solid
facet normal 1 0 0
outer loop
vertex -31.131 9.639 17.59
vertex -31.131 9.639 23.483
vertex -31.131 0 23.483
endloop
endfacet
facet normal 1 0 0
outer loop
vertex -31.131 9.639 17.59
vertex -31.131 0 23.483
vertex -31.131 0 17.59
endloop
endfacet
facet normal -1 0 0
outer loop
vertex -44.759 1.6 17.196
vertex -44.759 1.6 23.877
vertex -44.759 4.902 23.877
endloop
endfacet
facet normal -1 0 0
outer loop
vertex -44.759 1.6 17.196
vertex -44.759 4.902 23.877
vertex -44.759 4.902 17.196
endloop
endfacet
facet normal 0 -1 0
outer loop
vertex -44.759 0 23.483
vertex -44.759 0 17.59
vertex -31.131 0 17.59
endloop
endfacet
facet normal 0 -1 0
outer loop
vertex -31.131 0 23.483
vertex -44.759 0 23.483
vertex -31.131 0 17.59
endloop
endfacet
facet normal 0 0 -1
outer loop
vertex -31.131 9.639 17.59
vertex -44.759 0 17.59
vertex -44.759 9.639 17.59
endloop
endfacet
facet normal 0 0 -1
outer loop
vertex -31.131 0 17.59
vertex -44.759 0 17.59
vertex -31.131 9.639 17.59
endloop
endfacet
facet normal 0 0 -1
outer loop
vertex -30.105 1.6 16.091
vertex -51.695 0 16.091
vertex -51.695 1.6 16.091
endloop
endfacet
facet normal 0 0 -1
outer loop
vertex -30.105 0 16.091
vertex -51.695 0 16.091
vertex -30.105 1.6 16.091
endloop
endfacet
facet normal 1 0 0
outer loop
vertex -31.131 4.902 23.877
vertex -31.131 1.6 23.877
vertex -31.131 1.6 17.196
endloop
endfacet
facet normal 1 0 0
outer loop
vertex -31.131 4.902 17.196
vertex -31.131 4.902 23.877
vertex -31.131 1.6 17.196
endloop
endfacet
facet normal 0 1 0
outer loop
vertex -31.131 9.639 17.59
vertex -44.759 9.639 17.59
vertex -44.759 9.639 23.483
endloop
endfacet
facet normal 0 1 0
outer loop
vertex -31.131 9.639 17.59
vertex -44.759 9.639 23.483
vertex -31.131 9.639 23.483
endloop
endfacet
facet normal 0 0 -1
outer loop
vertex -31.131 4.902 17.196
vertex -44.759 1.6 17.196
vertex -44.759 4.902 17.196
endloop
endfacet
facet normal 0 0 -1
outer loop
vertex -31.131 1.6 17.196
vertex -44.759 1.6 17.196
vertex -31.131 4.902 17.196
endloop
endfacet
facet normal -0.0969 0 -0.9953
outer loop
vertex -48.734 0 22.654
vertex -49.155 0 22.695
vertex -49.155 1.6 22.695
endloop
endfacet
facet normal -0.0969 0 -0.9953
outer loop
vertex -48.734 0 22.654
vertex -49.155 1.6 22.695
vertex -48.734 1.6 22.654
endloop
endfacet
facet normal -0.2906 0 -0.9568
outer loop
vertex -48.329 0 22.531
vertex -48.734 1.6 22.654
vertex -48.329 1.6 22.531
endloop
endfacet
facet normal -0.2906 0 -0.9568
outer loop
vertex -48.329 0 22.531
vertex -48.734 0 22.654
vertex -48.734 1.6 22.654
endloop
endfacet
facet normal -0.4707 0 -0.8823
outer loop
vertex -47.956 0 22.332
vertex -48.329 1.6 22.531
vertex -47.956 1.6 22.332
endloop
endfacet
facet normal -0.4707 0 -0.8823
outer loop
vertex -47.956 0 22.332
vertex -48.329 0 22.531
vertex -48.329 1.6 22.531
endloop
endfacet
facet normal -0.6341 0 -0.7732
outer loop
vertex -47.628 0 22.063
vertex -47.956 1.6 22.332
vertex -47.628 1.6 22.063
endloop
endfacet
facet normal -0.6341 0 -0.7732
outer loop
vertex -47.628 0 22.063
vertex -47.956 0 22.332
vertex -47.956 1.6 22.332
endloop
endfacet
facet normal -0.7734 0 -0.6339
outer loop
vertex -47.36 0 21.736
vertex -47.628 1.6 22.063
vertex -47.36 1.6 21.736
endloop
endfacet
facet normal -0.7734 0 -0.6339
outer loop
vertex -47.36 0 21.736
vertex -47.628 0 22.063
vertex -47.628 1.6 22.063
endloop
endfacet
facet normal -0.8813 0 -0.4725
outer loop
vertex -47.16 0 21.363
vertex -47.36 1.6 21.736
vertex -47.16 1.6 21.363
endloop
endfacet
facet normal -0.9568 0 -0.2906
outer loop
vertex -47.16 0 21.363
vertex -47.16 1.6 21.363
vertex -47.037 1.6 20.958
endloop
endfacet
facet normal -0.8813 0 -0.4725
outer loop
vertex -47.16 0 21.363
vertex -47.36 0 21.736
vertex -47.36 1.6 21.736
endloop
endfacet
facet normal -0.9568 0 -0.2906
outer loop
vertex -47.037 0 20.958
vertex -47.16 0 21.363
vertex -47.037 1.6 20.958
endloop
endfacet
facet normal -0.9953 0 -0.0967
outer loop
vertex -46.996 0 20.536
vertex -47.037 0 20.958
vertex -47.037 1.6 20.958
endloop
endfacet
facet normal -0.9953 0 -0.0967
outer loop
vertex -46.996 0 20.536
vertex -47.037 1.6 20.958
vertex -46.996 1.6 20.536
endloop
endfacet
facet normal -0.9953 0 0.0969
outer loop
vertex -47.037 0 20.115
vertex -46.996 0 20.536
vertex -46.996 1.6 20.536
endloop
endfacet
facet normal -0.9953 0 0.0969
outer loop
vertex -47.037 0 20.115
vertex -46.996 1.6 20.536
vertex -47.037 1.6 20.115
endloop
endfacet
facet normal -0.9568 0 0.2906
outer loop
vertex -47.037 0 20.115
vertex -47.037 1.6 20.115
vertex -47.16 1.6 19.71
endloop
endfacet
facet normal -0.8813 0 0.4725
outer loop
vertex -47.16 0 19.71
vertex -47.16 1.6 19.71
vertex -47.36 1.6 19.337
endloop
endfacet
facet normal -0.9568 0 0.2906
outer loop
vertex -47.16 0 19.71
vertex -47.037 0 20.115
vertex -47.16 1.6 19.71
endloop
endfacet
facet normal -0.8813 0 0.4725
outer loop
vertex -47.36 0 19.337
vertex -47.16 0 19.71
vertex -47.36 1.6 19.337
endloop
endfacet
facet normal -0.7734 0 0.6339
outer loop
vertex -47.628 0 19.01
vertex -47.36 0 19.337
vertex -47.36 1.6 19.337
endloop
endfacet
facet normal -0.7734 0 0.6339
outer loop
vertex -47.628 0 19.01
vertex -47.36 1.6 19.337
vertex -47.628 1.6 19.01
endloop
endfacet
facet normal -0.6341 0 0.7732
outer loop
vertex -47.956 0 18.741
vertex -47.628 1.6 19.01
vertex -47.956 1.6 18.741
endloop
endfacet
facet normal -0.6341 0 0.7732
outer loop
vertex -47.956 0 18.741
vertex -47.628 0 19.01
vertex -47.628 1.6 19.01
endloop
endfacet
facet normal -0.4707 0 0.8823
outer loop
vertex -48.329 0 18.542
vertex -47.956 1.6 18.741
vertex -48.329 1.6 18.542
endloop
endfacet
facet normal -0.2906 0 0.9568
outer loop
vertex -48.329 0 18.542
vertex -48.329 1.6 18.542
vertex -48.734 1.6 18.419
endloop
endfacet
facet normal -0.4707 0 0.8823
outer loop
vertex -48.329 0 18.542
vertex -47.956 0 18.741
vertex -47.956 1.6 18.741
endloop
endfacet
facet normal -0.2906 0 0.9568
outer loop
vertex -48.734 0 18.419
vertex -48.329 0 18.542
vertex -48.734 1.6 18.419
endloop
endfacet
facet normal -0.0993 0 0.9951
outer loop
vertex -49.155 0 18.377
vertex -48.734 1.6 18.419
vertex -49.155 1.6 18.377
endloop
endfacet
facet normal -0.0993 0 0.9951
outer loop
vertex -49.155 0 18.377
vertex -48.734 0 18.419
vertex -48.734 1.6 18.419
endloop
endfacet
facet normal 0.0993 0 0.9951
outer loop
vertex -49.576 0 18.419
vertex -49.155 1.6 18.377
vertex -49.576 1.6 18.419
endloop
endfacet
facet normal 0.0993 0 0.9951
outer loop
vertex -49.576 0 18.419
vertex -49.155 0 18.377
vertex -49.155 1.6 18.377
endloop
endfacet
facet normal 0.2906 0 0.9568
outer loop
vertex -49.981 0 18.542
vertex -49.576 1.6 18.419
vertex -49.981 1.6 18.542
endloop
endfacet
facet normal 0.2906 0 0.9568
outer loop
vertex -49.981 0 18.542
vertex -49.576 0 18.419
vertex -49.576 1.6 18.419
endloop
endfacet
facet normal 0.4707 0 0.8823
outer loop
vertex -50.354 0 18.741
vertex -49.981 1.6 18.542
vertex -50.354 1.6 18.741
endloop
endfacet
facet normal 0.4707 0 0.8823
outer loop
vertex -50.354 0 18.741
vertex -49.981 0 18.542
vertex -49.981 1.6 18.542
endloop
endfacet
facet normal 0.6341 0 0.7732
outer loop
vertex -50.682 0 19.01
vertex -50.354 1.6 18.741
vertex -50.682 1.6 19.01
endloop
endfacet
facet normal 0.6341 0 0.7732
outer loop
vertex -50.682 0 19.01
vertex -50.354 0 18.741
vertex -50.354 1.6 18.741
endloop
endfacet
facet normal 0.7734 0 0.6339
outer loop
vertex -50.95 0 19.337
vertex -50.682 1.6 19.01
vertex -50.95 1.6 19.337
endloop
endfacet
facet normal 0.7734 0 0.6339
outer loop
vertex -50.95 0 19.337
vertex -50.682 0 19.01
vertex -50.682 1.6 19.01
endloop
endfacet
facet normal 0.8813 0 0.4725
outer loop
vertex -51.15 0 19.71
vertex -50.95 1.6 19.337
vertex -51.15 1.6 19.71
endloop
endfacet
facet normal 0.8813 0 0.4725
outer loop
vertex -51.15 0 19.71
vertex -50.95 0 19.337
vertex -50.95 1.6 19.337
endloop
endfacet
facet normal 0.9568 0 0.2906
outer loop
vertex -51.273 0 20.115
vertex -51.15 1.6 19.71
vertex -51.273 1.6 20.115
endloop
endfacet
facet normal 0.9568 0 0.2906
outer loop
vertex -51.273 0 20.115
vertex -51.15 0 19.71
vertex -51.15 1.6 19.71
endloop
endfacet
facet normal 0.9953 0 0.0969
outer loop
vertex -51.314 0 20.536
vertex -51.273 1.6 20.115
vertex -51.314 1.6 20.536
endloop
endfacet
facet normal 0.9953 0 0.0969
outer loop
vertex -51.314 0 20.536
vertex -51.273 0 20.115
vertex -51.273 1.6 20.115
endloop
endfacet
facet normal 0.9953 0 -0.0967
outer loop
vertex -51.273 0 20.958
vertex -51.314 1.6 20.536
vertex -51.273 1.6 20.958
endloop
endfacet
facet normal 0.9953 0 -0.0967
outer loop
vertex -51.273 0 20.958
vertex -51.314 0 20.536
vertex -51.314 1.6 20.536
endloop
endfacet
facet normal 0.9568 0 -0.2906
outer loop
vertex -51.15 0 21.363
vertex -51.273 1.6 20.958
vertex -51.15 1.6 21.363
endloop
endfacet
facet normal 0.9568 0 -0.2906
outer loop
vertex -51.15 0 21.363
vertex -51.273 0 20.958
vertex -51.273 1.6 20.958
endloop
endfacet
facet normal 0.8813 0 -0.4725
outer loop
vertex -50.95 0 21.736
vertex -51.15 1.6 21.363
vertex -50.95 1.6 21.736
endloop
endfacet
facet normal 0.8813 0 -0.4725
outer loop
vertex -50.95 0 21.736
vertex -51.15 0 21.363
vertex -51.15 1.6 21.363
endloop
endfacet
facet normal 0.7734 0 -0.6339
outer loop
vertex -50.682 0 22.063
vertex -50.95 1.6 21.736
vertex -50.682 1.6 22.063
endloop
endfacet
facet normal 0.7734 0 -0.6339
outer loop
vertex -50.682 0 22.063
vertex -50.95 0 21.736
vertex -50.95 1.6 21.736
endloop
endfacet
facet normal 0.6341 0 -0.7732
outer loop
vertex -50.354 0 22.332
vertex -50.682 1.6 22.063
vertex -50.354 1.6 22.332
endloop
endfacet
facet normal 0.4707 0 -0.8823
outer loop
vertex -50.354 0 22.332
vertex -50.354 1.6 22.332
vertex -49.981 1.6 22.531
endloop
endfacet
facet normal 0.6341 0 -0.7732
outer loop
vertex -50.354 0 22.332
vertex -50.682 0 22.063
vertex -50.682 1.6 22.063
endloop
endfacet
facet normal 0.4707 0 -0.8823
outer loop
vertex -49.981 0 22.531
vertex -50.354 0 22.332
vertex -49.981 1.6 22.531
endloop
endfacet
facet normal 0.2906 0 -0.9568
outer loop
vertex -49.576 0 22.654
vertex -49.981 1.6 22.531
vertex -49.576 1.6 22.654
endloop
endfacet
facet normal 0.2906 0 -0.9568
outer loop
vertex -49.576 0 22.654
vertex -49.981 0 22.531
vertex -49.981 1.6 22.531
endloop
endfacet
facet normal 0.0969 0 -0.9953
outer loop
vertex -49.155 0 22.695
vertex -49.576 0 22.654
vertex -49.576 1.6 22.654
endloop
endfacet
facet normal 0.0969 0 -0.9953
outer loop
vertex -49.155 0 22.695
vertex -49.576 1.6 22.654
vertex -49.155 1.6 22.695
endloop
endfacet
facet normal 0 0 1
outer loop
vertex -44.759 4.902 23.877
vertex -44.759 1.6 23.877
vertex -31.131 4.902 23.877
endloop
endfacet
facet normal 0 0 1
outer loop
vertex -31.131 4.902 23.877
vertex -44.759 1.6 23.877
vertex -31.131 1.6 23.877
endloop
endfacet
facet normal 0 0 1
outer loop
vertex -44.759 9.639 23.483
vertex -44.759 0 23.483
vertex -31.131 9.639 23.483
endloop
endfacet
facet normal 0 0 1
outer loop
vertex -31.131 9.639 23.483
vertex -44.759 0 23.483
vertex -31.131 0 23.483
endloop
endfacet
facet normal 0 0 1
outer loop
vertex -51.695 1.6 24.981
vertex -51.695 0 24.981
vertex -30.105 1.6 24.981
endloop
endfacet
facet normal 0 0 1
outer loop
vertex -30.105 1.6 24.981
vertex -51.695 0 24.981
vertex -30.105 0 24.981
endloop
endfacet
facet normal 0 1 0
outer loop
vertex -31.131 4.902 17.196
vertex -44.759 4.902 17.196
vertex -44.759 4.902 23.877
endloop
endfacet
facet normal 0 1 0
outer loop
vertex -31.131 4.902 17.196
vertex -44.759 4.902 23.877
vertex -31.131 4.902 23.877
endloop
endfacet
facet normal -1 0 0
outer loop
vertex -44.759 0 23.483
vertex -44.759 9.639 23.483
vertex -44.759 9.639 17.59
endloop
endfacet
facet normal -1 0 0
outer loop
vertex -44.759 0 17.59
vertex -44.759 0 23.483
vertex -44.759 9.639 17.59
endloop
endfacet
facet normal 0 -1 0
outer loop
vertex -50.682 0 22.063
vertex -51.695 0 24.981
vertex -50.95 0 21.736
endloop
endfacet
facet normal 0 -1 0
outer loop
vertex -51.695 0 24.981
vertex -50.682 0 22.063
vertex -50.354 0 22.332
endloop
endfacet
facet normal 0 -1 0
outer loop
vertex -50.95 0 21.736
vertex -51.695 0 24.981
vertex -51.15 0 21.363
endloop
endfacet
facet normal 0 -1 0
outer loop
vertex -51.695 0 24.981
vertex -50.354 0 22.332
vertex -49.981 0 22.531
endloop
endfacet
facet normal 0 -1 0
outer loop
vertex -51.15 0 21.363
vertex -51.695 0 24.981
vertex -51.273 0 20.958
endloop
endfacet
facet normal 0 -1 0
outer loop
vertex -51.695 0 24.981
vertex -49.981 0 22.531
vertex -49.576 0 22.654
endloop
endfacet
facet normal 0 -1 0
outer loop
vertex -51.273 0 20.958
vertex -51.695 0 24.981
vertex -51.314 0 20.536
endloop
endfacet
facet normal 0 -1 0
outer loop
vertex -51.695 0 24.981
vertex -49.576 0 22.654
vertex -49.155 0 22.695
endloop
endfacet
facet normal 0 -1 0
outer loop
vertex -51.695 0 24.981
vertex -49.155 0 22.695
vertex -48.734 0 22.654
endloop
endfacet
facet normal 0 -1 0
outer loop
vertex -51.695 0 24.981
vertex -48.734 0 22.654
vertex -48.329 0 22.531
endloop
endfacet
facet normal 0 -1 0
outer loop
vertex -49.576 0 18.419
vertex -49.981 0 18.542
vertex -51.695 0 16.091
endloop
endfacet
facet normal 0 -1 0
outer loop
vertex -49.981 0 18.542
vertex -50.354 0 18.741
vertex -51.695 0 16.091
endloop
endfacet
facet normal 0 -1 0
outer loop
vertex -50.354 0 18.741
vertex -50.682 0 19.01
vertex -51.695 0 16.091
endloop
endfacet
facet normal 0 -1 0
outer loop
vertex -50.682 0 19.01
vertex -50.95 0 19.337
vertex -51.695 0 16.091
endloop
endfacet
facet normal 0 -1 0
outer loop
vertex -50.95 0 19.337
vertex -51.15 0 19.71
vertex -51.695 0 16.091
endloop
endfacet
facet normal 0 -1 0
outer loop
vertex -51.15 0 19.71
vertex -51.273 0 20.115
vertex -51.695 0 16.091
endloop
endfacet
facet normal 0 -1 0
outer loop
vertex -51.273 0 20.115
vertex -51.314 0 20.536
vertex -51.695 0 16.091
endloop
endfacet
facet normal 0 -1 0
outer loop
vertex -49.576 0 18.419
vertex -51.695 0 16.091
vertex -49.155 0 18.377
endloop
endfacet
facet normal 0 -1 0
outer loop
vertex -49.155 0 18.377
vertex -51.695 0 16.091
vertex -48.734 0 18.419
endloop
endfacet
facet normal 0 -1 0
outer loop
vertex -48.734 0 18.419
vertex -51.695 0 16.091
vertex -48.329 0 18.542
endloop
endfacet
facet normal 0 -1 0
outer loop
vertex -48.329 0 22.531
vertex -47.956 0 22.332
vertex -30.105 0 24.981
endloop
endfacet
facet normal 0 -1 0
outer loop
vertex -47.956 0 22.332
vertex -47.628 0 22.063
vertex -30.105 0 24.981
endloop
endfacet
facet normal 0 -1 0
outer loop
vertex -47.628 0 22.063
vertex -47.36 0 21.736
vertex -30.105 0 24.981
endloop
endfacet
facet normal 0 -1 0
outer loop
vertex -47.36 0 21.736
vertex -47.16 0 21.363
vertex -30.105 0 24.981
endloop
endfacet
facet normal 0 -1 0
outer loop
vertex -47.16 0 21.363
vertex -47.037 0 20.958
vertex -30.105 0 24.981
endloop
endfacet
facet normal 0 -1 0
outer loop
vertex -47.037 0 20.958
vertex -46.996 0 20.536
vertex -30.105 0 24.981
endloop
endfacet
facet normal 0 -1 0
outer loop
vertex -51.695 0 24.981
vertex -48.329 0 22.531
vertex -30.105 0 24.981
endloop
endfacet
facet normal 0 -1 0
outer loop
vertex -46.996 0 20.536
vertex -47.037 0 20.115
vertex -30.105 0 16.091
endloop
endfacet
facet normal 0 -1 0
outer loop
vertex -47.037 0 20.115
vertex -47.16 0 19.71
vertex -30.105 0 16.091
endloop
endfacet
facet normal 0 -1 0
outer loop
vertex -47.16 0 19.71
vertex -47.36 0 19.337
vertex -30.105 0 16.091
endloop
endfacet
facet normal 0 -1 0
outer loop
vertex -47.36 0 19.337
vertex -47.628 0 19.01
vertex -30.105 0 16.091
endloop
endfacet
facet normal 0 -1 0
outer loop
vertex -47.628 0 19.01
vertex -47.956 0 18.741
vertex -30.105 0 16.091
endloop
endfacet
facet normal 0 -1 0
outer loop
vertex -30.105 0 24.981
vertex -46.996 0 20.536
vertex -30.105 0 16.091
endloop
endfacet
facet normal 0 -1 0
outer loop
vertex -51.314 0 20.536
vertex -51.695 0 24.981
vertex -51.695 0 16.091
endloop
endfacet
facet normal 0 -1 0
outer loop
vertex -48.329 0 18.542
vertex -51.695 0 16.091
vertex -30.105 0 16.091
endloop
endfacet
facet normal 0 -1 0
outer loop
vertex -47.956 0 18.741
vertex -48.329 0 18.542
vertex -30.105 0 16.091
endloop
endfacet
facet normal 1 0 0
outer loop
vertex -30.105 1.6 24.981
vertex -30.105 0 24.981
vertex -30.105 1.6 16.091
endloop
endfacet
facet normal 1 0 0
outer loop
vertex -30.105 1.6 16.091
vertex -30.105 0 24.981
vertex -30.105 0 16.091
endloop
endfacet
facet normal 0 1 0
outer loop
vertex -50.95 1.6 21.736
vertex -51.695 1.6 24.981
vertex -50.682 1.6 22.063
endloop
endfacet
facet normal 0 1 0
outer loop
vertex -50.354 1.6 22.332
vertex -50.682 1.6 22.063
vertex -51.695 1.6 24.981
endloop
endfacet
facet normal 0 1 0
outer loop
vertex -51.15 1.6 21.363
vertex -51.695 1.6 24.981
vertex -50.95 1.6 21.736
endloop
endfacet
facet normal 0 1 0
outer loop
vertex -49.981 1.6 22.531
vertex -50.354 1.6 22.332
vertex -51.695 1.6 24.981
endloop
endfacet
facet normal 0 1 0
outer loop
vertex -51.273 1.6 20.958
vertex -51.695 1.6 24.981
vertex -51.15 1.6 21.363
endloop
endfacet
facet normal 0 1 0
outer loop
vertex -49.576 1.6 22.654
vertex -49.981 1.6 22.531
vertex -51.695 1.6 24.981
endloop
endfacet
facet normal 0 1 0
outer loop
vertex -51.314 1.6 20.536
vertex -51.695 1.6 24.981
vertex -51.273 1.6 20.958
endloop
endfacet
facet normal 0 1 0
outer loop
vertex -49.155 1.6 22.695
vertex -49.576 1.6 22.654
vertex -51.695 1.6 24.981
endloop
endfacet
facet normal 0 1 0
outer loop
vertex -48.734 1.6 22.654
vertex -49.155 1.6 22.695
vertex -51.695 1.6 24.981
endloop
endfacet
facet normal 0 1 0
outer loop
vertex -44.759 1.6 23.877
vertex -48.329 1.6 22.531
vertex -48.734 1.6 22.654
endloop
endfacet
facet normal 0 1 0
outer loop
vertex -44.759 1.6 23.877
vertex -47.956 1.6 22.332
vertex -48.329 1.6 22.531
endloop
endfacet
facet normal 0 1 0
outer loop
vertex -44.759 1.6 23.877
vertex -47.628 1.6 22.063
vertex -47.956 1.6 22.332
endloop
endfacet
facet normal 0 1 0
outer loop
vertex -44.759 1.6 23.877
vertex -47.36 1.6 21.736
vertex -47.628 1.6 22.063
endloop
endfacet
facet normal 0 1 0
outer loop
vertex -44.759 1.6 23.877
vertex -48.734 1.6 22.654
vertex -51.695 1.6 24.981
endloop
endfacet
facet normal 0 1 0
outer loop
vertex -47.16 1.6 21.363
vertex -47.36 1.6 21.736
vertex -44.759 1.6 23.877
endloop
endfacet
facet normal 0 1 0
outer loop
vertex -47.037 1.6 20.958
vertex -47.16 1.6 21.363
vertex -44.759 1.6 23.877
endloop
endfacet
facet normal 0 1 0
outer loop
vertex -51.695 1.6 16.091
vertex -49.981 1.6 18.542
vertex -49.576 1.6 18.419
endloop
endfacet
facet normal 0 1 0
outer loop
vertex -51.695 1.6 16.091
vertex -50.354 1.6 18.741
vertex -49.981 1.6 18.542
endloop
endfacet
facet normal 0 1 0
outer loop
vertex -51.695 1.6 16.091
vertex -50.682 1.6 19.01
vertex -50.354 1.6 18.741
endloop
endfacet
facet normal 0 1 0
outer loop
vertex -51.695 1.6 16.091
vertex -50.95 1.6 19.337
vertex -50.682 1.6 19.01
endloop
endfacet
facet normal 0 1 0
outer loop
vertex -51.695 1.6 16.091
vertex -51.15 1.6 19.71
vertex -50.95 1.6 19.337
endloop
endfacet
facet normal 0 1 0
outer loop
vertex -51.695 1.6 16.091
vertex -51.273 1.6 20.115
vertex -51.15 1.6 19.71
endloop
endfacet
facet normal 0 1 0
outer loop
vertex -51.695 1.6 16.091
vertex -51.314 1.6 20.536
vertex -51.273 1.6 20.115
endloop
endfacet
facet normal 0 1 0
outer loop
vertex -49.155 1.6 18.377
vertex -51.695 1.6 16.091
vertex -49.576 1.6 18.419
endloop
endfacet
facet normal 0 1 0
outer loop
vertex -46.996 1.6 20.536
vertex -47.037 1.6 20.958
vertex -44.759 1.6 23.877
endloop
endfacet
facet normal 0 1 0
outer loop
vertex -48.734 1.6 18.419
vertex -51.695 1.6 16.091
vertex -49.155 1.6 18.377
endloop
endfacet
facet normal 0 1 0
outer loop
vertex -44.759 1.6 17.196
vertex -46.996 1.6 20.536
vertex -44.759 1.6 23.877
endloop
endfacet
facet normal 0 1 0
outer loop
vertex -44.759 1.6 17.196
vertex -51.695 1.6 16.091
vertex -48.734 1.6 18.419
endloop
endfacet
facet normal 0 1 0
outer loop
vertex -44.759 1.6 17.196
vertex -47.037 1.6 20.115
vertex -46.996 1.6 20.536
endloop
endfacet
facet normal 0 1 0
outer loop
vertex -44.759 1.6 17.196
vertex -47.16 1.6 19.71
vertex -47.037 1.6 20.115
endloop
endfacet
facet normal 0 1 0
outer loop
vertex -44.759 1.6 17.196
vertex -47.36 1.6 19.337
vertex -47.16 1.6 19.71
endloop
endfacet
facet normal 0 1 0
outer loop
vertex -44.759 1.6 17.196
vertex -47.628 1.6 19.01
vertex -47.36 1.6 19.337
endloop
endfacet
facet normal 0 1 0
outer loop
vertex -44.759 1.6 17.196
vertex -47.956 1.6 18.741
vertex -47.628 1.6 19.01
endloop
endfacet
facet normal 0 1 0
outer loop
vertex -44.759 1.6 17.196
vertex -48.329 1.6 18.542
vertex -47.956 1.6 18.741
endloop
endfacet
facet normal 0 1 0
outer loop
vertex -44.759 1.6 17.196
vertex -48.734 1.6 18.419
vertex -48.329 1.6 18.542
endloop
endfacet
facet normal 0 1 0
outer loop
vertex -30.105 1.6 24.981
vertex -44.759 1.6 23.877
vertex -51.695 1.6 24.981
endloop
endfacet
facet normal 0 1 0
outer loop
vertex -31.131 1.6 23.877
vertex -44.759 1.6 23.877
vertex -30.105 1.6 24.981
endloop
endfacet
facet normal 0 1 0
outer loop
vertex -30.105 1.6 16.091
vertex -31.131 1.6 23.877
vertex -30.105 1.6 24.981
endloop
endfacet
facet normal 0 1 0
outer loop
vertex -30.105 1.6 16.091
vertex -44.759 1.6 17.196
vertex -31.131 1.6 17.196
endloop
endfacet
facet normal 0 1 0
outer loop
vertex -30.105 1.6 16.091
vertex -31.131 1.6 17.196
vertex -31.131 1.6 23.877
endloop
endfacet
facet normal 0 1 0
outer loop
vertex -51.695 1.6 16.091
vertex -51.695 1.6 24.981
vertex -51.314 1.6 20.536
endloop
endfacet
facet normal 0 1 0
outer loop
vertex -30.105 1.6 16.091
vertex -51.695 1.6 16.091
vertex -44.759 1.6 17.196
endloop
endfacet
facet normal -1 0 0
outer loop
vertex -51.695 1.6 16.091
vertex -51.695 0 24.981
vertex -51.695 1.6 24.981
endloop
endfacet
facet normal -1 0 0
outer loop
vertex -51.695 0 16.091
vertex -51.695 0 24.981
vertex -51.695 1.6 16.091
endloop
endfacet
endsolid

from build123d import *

# Parameters (mm, degrees)
SKETCH1_W           = 21.59
SKETCH1_H           = 8.89
SKETCH1_R           = 2.159
BOSS_EXTRUDE1_DEPTH = 1.6002
SKETCH2_W           = 13.6271
SKETCH2_H           = 6.6802
BOSS_EXTRUDE2_DEPTH = 4.9022
SKETCH3_W           = 13.6271
SKETCH3_H           = 5.8928
BOSS_EXTRUDE3_DEPTH = 9.6393


with BuildPart() as part:
    # Sketch1 → Boss-Extrude1 (new body)
    with BuildSketch(Plane(origin=(0, 0, 0), x_dir=(1, 0, 0), z_dir=(0, 1, 0))):
        with Locations((-40.899991391, -20.536497471)):
            Rectangle(SKETCH1_W, SKETCH1_H)
        with Locations(Location((-49.154991391, -20.536497471, 0), (0, 0, 270))):
            Circle(SKETCH1_R, mode=Mode.SUBTRACT)
    extrude(amount=BOSS_EXTRUDE1_DEPTH)

    # Sketch2 → Boss-Extrude2 (add)
    with BuildSketch(Plane(origin=(0, 0, 0), x_dir=(1, 0, 0), z_dir=(0, 1, 0))):
        with Locations((-37.945014507, -20.536497471)):
            Rectangle(SKETCH2_W, SKETCH2_H)
    extrude(amount=BOSS_EXTRUDE2_DEPTH)


with BuildPart() as body_2:
    # Sketch3 → Boss-Extrude3 (new body)
    with BuildSketch(Plane(origin=(0, 0, 0), x_dir=(1, 0, 0), z_dir=(0, 1, 0))):
        with Locations((-37.945014507, -20.536497471)):
            Rectangle(SKETCH3_W, SKETCH3_H)
    extrude(amount=BOSS_EXTRUDE3_DEPTH)


solid = Compound([part.part, body_2.part])
